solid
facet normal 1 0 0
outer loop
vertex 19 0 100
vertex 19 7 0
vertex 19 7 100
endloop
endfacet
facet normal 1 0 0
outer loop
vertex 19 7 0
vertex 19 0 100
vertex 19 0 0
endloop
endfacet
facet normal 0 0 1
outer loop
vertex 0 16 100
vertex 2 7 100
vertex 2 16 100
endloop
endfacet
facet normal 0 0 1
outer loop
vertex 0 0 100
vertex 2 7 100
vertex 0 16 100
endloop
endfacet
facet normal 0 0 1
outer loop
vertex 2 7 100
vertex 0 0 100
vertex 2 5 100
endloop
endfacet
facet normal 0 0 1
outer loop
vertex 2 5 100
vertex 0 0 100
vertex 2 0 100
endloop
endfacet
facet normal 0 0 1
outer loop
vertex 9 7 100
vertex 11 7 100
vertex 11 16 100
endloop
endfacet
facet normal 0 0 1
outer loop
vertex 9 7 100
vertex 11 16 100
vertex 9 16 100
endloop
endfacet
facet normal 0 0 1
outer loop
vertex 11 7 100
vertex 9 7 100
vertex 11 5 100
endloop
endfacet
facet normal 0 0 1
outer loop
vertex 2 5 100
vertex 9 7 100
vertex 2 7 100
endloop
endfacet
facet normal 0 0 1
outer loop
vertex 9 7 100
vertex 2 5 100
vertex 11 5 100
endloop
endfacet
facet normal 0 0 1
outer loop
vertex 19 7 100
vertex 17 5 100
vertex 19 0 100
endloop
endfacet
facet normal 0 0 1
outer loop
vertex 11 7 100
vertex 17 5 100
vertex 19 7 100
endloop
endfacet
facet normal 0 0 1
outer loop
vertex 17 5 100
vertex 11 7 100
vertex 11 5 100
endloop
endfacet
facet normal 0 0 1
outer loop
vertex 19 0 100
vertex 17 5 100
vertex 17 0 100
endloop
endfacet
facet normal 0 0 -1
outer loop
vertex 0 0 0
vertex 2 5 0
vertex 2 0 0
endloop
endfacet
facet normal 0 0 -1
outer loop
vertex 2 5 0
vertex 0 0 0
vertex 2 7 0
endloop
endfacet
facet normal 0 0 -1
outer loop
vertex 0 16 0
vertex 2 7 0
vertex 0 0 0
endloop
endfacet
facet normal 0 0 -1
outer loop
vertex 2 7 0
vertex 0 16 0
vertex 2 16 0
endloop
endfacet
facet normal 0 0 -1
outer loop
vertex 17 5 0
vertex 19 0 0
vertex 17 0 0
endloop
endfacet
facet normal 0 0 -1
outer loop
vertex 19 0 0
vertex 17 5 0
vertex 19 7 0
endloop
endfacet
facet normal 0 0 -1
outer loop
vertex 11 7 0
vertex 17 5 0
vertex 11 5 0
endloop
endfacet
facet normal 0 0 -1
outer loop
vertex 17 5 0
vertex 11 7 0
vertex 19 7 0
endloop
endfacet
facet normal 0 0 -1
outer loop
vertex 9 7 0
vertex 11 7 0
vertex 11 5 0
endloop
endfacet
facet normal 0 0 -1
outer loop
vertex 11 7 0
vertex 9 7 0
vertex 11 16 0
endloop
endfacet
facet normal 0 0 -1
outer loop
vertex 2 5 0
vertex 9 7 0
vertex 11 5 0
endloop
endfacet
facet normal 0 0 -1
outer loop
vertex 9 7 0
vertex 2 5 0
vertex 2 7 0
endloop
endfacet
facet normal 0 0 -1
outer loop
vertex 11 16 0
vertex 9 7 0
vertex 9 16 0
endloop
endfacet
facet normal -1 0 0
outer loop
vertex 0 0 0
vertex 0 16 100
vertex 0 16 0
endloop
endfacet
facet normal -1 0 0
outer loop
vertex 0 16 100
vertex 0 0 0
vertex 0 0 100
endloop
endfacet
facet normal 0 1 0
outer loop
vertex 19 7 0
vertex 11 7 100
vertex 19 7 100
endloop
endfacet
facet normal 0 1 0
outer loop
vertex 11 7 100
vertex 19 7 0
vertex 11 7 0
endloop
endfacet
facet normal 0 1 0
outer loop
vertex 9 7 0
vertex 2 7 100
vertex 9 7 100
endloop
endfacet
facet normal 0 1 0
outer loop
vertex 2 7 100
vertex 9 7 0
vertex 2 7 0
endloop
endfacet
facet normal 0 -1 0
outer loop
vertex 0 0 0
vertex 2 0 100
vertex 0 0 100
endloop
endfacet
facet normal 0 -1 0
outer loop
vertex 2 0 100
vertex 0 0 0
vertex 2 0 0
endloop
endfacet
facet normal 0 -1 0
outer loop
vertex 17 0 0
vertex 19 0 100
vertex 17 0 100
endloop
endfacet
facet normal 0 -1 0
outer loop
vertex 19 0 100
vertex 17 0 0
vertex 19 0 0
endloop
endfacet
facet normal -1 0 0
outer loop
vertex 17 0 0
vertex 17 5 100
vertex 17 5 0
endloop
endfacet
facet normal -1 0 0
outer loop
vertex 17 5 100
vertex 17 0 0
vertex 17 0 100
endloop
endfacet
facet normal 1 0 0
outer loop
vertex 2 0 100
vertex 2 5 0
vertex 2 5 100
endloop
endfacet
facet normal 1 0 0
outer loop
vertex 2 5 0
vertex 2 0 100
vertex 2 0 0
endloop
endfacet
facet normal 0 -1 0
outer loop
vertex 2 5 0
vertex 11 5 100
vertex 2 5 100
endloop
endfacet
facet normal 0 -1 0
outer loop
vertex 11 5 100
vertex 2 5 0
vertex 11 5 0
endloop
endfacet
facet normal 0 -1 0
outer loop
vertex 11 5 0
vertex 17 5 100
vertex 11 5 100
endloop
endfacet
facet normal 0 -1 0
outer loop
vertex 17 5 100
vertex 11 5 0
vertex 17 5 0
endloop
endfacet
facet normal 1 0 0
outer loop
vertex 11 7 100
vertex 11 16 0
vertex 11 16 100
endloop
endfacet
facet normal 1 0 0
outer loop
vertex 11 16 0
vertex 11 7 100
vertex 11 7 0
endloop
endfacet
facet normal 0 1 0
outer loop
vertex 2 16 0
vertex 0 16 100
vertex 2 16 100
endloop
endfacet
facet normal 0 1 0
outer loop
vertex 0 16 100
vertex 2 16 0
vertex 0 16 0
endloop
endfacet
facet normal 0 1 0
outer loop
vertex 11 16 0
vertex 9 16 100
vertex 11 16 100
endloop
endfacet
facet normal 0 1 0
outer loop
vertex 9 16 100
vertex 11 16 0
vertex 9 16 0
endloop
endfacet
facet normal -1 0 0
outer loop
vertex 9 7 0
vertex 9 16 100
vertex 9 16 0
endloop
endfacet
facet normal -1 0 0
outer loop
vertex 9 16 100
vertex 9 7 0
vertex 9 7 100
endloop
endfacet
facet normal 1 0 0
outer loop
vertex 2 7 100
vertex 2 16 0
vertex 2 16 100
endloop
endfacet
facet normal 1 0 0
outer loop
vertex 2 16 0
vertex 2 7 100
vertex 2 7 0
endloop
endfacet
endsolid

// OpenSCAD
// [FL_INDEX: keywords="openscad, 3d_parametric, Whiteboard_marker_tray__parametric, csg_solid" | COT="Parametric OpenSCAD design from 3DCodeverse"]
// Title: Whiteboard marker tray (parametric)

wall_thickness = 2;
tray_height = 7;
tray_width = 15;
clip_height = 11;
clip_width = 7;
holder_length = 100;

module marker_holder() {
  union() {
    difference() {
      cube([tray_width + 2 * wall_thickness, tray_height, holder_length]);
      translate([wall_thickness, -wall_thickness, -wall_thickness / 2]) {
        cube([tray_width, tray_height, holder_length + wall_thickness]);
      }
    }
    translate([0, 5, 0]) {
      difference() {
        cube([clip_width + 2 * wall_thickness, clip_height, holder_length]);
        translate([wall_thickness, wall_thickness, -wall_thickness / 2]) {
          cube([clip_width, clip_height, holder_length + wall_thickness]);
        }
      }
    }
  }
}

marker_holder();
